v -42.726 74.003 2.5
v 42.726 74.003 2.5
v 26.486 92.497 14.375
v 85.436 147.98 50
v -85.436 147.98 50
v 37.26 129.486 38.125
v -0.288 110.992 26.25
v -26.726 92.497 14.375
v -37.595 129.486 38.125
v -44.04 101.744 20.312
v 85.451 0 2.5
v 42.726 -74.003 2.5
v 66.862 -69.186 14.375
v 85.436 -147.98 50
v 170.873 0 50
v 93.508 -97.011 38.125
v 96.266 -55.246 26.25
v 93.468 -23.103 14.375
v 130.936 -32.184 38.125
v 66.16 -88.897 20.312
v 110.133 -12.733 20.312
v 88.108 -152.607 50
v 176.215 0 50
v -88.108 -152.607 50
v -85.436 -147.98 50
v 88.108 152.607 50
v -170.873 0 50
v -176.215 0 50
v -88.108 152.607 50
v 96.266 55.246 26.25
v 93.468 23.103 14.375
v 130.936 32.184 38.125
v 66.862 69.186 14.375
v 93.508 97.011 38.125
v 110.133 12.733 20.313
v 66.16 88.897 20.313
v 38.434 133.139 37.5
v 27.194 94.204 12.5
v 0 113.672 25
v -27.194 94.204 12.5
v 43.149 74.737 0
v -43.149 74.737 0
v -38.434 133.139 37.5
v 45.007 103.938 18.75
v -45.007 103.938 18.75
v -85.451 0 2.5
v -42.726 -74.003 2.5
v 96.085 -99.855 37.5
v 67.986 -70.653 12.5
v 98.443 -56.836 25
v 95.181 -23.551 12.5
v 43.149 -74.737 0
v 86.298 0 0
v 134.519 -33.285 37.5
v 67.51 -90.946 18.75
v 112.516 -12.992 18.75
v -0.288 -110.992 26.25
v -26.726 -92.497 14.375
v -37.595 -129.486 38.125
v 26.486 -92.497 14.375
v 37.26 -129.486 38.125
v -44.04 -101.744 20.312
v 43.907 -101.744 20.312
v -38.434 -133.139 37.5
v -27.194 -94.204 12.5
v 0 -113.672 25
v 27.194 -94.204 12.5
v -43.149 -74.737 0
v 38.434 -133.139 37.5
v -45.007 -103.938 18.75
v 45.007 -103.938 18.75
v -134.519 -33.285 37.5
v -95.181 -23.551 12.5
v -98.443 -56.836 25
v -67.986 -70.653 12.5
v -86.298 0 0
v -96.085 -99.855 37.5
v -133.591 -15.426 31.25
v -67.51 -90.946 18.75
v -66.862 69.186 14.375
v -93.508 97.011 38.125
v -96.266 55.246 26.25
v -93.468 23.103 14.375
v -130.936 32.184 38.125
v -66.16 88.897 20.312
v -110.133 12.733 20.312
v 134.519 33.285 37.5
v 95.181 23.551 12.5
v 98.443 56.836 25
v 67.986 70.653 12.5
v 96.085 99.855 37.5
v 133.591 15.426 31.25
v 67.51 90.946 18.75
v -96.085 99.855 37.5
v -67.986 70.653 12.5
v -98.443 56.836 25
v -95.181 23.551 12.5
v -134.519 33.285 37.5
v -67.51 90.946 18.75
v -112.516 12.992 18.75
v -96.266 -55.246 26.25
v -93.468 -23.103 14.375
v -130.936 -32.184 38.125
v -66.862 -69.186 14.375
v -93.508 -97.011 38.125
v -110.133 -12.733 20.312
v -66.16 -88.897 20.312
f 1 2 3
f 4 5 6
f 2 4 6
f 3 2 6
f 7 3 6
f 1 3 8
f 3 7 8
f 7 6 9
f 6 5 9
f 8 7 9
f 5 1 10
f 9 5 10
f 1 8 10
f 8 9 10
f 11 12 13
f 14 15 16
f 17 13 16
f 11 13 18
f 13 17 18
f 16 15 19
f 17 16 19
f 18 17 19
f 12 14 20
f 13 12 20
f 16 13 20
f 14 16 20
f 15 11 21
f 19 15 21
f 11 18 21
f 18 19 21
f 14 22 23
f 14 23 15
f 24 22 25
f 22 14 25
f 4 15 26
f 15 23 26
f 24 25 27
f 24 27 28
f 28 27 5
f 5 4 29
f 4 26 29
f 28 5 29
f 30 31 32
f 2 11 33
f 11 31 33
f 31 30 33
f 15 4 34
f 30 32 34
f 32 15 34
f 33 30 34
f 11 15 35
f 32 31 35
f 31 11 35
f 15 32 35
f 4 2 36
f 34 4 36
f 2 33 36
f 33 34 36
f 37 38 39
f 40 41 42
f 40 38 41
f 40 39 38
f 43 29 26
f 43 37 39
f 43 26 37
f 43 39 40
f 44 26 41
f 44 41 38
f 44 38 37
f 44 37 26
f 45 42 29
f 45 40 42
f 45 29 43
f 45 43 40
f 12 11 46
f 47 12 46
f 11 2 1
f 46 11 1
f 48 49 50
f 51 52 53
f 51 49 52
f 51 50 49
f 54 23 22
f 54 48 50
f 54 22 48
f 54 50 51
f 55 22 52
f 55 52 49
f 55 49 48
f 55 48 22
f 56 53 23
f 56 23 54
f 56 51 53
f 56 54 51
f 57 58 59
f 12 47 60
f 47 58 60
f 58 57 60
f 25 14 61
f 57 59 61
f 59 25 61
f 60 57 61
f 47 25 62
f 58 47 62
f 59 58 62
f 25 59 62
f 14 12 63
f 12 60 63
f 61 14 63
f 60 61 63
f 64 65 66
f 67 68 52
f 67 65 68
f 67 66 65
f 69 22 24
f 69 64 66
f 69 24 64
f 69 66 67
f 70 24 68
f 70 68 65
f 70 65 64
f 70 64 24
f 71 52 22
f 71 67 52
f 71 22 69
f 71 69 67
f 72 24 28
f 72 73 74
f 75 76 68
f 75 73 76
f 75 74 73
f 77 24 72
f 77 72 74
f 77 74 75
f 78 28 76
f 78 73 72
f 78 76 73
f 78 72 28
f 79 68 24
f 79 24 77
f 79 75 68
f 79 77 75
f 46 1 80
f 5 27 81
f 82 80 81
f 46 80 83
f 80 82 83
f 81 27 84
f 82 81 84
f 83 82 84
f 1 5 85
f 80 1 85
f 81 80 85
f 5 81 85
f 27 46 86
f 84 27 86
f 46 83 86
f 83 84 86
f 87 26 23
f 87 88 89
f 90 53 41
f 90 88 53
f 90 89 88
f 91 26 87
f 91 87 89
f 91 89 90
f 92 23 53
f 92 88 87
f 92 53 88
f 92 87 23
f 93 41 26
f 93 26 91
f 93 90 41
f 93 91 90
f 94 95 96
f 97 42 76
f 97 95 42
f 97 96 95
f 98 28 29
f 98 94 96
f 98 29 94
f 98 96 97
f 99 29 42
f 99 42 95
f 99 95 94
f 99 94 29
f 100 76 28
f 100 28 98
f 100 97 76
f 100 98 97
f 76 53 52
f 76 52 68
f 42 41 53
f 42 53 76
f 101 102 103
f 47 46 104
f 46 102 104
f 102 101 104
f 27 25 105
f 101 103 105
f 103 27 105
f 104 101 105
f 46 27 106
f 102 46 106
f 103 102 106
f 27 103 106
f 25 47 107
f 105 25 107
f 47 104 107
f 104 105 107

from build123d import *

# Parameters (mm, degrees)
F1_DEPTH = 50
F1_TAPER = -57.2957795131
F2_T     = -2.5


with BuildPart() as f1:
    # F0 (on Top) → F1 (new body)
    with BuildSketch(Plane.XY):
        Polygon((86.2984904265, 0), (43.1492452133, 74.7366850176), (-43.1492452133, 74.7366850176), (-86.2984904265, 0), (-43.1492452133, -74.7366850176), (43.1492452133, -74.7366850176), align=None)
    extrude(amount=F1_DEPTH, taper=F1_TAPER)

    # F2
    f2_openings = [f1.faces().sort_by_distance(p)[0] for p in [
        (0, 0, 50),
    ]]
    offset(amount=F2_T, openings=f2_openings, kind=Kind.INTERSECTION)


solid = f1.part
